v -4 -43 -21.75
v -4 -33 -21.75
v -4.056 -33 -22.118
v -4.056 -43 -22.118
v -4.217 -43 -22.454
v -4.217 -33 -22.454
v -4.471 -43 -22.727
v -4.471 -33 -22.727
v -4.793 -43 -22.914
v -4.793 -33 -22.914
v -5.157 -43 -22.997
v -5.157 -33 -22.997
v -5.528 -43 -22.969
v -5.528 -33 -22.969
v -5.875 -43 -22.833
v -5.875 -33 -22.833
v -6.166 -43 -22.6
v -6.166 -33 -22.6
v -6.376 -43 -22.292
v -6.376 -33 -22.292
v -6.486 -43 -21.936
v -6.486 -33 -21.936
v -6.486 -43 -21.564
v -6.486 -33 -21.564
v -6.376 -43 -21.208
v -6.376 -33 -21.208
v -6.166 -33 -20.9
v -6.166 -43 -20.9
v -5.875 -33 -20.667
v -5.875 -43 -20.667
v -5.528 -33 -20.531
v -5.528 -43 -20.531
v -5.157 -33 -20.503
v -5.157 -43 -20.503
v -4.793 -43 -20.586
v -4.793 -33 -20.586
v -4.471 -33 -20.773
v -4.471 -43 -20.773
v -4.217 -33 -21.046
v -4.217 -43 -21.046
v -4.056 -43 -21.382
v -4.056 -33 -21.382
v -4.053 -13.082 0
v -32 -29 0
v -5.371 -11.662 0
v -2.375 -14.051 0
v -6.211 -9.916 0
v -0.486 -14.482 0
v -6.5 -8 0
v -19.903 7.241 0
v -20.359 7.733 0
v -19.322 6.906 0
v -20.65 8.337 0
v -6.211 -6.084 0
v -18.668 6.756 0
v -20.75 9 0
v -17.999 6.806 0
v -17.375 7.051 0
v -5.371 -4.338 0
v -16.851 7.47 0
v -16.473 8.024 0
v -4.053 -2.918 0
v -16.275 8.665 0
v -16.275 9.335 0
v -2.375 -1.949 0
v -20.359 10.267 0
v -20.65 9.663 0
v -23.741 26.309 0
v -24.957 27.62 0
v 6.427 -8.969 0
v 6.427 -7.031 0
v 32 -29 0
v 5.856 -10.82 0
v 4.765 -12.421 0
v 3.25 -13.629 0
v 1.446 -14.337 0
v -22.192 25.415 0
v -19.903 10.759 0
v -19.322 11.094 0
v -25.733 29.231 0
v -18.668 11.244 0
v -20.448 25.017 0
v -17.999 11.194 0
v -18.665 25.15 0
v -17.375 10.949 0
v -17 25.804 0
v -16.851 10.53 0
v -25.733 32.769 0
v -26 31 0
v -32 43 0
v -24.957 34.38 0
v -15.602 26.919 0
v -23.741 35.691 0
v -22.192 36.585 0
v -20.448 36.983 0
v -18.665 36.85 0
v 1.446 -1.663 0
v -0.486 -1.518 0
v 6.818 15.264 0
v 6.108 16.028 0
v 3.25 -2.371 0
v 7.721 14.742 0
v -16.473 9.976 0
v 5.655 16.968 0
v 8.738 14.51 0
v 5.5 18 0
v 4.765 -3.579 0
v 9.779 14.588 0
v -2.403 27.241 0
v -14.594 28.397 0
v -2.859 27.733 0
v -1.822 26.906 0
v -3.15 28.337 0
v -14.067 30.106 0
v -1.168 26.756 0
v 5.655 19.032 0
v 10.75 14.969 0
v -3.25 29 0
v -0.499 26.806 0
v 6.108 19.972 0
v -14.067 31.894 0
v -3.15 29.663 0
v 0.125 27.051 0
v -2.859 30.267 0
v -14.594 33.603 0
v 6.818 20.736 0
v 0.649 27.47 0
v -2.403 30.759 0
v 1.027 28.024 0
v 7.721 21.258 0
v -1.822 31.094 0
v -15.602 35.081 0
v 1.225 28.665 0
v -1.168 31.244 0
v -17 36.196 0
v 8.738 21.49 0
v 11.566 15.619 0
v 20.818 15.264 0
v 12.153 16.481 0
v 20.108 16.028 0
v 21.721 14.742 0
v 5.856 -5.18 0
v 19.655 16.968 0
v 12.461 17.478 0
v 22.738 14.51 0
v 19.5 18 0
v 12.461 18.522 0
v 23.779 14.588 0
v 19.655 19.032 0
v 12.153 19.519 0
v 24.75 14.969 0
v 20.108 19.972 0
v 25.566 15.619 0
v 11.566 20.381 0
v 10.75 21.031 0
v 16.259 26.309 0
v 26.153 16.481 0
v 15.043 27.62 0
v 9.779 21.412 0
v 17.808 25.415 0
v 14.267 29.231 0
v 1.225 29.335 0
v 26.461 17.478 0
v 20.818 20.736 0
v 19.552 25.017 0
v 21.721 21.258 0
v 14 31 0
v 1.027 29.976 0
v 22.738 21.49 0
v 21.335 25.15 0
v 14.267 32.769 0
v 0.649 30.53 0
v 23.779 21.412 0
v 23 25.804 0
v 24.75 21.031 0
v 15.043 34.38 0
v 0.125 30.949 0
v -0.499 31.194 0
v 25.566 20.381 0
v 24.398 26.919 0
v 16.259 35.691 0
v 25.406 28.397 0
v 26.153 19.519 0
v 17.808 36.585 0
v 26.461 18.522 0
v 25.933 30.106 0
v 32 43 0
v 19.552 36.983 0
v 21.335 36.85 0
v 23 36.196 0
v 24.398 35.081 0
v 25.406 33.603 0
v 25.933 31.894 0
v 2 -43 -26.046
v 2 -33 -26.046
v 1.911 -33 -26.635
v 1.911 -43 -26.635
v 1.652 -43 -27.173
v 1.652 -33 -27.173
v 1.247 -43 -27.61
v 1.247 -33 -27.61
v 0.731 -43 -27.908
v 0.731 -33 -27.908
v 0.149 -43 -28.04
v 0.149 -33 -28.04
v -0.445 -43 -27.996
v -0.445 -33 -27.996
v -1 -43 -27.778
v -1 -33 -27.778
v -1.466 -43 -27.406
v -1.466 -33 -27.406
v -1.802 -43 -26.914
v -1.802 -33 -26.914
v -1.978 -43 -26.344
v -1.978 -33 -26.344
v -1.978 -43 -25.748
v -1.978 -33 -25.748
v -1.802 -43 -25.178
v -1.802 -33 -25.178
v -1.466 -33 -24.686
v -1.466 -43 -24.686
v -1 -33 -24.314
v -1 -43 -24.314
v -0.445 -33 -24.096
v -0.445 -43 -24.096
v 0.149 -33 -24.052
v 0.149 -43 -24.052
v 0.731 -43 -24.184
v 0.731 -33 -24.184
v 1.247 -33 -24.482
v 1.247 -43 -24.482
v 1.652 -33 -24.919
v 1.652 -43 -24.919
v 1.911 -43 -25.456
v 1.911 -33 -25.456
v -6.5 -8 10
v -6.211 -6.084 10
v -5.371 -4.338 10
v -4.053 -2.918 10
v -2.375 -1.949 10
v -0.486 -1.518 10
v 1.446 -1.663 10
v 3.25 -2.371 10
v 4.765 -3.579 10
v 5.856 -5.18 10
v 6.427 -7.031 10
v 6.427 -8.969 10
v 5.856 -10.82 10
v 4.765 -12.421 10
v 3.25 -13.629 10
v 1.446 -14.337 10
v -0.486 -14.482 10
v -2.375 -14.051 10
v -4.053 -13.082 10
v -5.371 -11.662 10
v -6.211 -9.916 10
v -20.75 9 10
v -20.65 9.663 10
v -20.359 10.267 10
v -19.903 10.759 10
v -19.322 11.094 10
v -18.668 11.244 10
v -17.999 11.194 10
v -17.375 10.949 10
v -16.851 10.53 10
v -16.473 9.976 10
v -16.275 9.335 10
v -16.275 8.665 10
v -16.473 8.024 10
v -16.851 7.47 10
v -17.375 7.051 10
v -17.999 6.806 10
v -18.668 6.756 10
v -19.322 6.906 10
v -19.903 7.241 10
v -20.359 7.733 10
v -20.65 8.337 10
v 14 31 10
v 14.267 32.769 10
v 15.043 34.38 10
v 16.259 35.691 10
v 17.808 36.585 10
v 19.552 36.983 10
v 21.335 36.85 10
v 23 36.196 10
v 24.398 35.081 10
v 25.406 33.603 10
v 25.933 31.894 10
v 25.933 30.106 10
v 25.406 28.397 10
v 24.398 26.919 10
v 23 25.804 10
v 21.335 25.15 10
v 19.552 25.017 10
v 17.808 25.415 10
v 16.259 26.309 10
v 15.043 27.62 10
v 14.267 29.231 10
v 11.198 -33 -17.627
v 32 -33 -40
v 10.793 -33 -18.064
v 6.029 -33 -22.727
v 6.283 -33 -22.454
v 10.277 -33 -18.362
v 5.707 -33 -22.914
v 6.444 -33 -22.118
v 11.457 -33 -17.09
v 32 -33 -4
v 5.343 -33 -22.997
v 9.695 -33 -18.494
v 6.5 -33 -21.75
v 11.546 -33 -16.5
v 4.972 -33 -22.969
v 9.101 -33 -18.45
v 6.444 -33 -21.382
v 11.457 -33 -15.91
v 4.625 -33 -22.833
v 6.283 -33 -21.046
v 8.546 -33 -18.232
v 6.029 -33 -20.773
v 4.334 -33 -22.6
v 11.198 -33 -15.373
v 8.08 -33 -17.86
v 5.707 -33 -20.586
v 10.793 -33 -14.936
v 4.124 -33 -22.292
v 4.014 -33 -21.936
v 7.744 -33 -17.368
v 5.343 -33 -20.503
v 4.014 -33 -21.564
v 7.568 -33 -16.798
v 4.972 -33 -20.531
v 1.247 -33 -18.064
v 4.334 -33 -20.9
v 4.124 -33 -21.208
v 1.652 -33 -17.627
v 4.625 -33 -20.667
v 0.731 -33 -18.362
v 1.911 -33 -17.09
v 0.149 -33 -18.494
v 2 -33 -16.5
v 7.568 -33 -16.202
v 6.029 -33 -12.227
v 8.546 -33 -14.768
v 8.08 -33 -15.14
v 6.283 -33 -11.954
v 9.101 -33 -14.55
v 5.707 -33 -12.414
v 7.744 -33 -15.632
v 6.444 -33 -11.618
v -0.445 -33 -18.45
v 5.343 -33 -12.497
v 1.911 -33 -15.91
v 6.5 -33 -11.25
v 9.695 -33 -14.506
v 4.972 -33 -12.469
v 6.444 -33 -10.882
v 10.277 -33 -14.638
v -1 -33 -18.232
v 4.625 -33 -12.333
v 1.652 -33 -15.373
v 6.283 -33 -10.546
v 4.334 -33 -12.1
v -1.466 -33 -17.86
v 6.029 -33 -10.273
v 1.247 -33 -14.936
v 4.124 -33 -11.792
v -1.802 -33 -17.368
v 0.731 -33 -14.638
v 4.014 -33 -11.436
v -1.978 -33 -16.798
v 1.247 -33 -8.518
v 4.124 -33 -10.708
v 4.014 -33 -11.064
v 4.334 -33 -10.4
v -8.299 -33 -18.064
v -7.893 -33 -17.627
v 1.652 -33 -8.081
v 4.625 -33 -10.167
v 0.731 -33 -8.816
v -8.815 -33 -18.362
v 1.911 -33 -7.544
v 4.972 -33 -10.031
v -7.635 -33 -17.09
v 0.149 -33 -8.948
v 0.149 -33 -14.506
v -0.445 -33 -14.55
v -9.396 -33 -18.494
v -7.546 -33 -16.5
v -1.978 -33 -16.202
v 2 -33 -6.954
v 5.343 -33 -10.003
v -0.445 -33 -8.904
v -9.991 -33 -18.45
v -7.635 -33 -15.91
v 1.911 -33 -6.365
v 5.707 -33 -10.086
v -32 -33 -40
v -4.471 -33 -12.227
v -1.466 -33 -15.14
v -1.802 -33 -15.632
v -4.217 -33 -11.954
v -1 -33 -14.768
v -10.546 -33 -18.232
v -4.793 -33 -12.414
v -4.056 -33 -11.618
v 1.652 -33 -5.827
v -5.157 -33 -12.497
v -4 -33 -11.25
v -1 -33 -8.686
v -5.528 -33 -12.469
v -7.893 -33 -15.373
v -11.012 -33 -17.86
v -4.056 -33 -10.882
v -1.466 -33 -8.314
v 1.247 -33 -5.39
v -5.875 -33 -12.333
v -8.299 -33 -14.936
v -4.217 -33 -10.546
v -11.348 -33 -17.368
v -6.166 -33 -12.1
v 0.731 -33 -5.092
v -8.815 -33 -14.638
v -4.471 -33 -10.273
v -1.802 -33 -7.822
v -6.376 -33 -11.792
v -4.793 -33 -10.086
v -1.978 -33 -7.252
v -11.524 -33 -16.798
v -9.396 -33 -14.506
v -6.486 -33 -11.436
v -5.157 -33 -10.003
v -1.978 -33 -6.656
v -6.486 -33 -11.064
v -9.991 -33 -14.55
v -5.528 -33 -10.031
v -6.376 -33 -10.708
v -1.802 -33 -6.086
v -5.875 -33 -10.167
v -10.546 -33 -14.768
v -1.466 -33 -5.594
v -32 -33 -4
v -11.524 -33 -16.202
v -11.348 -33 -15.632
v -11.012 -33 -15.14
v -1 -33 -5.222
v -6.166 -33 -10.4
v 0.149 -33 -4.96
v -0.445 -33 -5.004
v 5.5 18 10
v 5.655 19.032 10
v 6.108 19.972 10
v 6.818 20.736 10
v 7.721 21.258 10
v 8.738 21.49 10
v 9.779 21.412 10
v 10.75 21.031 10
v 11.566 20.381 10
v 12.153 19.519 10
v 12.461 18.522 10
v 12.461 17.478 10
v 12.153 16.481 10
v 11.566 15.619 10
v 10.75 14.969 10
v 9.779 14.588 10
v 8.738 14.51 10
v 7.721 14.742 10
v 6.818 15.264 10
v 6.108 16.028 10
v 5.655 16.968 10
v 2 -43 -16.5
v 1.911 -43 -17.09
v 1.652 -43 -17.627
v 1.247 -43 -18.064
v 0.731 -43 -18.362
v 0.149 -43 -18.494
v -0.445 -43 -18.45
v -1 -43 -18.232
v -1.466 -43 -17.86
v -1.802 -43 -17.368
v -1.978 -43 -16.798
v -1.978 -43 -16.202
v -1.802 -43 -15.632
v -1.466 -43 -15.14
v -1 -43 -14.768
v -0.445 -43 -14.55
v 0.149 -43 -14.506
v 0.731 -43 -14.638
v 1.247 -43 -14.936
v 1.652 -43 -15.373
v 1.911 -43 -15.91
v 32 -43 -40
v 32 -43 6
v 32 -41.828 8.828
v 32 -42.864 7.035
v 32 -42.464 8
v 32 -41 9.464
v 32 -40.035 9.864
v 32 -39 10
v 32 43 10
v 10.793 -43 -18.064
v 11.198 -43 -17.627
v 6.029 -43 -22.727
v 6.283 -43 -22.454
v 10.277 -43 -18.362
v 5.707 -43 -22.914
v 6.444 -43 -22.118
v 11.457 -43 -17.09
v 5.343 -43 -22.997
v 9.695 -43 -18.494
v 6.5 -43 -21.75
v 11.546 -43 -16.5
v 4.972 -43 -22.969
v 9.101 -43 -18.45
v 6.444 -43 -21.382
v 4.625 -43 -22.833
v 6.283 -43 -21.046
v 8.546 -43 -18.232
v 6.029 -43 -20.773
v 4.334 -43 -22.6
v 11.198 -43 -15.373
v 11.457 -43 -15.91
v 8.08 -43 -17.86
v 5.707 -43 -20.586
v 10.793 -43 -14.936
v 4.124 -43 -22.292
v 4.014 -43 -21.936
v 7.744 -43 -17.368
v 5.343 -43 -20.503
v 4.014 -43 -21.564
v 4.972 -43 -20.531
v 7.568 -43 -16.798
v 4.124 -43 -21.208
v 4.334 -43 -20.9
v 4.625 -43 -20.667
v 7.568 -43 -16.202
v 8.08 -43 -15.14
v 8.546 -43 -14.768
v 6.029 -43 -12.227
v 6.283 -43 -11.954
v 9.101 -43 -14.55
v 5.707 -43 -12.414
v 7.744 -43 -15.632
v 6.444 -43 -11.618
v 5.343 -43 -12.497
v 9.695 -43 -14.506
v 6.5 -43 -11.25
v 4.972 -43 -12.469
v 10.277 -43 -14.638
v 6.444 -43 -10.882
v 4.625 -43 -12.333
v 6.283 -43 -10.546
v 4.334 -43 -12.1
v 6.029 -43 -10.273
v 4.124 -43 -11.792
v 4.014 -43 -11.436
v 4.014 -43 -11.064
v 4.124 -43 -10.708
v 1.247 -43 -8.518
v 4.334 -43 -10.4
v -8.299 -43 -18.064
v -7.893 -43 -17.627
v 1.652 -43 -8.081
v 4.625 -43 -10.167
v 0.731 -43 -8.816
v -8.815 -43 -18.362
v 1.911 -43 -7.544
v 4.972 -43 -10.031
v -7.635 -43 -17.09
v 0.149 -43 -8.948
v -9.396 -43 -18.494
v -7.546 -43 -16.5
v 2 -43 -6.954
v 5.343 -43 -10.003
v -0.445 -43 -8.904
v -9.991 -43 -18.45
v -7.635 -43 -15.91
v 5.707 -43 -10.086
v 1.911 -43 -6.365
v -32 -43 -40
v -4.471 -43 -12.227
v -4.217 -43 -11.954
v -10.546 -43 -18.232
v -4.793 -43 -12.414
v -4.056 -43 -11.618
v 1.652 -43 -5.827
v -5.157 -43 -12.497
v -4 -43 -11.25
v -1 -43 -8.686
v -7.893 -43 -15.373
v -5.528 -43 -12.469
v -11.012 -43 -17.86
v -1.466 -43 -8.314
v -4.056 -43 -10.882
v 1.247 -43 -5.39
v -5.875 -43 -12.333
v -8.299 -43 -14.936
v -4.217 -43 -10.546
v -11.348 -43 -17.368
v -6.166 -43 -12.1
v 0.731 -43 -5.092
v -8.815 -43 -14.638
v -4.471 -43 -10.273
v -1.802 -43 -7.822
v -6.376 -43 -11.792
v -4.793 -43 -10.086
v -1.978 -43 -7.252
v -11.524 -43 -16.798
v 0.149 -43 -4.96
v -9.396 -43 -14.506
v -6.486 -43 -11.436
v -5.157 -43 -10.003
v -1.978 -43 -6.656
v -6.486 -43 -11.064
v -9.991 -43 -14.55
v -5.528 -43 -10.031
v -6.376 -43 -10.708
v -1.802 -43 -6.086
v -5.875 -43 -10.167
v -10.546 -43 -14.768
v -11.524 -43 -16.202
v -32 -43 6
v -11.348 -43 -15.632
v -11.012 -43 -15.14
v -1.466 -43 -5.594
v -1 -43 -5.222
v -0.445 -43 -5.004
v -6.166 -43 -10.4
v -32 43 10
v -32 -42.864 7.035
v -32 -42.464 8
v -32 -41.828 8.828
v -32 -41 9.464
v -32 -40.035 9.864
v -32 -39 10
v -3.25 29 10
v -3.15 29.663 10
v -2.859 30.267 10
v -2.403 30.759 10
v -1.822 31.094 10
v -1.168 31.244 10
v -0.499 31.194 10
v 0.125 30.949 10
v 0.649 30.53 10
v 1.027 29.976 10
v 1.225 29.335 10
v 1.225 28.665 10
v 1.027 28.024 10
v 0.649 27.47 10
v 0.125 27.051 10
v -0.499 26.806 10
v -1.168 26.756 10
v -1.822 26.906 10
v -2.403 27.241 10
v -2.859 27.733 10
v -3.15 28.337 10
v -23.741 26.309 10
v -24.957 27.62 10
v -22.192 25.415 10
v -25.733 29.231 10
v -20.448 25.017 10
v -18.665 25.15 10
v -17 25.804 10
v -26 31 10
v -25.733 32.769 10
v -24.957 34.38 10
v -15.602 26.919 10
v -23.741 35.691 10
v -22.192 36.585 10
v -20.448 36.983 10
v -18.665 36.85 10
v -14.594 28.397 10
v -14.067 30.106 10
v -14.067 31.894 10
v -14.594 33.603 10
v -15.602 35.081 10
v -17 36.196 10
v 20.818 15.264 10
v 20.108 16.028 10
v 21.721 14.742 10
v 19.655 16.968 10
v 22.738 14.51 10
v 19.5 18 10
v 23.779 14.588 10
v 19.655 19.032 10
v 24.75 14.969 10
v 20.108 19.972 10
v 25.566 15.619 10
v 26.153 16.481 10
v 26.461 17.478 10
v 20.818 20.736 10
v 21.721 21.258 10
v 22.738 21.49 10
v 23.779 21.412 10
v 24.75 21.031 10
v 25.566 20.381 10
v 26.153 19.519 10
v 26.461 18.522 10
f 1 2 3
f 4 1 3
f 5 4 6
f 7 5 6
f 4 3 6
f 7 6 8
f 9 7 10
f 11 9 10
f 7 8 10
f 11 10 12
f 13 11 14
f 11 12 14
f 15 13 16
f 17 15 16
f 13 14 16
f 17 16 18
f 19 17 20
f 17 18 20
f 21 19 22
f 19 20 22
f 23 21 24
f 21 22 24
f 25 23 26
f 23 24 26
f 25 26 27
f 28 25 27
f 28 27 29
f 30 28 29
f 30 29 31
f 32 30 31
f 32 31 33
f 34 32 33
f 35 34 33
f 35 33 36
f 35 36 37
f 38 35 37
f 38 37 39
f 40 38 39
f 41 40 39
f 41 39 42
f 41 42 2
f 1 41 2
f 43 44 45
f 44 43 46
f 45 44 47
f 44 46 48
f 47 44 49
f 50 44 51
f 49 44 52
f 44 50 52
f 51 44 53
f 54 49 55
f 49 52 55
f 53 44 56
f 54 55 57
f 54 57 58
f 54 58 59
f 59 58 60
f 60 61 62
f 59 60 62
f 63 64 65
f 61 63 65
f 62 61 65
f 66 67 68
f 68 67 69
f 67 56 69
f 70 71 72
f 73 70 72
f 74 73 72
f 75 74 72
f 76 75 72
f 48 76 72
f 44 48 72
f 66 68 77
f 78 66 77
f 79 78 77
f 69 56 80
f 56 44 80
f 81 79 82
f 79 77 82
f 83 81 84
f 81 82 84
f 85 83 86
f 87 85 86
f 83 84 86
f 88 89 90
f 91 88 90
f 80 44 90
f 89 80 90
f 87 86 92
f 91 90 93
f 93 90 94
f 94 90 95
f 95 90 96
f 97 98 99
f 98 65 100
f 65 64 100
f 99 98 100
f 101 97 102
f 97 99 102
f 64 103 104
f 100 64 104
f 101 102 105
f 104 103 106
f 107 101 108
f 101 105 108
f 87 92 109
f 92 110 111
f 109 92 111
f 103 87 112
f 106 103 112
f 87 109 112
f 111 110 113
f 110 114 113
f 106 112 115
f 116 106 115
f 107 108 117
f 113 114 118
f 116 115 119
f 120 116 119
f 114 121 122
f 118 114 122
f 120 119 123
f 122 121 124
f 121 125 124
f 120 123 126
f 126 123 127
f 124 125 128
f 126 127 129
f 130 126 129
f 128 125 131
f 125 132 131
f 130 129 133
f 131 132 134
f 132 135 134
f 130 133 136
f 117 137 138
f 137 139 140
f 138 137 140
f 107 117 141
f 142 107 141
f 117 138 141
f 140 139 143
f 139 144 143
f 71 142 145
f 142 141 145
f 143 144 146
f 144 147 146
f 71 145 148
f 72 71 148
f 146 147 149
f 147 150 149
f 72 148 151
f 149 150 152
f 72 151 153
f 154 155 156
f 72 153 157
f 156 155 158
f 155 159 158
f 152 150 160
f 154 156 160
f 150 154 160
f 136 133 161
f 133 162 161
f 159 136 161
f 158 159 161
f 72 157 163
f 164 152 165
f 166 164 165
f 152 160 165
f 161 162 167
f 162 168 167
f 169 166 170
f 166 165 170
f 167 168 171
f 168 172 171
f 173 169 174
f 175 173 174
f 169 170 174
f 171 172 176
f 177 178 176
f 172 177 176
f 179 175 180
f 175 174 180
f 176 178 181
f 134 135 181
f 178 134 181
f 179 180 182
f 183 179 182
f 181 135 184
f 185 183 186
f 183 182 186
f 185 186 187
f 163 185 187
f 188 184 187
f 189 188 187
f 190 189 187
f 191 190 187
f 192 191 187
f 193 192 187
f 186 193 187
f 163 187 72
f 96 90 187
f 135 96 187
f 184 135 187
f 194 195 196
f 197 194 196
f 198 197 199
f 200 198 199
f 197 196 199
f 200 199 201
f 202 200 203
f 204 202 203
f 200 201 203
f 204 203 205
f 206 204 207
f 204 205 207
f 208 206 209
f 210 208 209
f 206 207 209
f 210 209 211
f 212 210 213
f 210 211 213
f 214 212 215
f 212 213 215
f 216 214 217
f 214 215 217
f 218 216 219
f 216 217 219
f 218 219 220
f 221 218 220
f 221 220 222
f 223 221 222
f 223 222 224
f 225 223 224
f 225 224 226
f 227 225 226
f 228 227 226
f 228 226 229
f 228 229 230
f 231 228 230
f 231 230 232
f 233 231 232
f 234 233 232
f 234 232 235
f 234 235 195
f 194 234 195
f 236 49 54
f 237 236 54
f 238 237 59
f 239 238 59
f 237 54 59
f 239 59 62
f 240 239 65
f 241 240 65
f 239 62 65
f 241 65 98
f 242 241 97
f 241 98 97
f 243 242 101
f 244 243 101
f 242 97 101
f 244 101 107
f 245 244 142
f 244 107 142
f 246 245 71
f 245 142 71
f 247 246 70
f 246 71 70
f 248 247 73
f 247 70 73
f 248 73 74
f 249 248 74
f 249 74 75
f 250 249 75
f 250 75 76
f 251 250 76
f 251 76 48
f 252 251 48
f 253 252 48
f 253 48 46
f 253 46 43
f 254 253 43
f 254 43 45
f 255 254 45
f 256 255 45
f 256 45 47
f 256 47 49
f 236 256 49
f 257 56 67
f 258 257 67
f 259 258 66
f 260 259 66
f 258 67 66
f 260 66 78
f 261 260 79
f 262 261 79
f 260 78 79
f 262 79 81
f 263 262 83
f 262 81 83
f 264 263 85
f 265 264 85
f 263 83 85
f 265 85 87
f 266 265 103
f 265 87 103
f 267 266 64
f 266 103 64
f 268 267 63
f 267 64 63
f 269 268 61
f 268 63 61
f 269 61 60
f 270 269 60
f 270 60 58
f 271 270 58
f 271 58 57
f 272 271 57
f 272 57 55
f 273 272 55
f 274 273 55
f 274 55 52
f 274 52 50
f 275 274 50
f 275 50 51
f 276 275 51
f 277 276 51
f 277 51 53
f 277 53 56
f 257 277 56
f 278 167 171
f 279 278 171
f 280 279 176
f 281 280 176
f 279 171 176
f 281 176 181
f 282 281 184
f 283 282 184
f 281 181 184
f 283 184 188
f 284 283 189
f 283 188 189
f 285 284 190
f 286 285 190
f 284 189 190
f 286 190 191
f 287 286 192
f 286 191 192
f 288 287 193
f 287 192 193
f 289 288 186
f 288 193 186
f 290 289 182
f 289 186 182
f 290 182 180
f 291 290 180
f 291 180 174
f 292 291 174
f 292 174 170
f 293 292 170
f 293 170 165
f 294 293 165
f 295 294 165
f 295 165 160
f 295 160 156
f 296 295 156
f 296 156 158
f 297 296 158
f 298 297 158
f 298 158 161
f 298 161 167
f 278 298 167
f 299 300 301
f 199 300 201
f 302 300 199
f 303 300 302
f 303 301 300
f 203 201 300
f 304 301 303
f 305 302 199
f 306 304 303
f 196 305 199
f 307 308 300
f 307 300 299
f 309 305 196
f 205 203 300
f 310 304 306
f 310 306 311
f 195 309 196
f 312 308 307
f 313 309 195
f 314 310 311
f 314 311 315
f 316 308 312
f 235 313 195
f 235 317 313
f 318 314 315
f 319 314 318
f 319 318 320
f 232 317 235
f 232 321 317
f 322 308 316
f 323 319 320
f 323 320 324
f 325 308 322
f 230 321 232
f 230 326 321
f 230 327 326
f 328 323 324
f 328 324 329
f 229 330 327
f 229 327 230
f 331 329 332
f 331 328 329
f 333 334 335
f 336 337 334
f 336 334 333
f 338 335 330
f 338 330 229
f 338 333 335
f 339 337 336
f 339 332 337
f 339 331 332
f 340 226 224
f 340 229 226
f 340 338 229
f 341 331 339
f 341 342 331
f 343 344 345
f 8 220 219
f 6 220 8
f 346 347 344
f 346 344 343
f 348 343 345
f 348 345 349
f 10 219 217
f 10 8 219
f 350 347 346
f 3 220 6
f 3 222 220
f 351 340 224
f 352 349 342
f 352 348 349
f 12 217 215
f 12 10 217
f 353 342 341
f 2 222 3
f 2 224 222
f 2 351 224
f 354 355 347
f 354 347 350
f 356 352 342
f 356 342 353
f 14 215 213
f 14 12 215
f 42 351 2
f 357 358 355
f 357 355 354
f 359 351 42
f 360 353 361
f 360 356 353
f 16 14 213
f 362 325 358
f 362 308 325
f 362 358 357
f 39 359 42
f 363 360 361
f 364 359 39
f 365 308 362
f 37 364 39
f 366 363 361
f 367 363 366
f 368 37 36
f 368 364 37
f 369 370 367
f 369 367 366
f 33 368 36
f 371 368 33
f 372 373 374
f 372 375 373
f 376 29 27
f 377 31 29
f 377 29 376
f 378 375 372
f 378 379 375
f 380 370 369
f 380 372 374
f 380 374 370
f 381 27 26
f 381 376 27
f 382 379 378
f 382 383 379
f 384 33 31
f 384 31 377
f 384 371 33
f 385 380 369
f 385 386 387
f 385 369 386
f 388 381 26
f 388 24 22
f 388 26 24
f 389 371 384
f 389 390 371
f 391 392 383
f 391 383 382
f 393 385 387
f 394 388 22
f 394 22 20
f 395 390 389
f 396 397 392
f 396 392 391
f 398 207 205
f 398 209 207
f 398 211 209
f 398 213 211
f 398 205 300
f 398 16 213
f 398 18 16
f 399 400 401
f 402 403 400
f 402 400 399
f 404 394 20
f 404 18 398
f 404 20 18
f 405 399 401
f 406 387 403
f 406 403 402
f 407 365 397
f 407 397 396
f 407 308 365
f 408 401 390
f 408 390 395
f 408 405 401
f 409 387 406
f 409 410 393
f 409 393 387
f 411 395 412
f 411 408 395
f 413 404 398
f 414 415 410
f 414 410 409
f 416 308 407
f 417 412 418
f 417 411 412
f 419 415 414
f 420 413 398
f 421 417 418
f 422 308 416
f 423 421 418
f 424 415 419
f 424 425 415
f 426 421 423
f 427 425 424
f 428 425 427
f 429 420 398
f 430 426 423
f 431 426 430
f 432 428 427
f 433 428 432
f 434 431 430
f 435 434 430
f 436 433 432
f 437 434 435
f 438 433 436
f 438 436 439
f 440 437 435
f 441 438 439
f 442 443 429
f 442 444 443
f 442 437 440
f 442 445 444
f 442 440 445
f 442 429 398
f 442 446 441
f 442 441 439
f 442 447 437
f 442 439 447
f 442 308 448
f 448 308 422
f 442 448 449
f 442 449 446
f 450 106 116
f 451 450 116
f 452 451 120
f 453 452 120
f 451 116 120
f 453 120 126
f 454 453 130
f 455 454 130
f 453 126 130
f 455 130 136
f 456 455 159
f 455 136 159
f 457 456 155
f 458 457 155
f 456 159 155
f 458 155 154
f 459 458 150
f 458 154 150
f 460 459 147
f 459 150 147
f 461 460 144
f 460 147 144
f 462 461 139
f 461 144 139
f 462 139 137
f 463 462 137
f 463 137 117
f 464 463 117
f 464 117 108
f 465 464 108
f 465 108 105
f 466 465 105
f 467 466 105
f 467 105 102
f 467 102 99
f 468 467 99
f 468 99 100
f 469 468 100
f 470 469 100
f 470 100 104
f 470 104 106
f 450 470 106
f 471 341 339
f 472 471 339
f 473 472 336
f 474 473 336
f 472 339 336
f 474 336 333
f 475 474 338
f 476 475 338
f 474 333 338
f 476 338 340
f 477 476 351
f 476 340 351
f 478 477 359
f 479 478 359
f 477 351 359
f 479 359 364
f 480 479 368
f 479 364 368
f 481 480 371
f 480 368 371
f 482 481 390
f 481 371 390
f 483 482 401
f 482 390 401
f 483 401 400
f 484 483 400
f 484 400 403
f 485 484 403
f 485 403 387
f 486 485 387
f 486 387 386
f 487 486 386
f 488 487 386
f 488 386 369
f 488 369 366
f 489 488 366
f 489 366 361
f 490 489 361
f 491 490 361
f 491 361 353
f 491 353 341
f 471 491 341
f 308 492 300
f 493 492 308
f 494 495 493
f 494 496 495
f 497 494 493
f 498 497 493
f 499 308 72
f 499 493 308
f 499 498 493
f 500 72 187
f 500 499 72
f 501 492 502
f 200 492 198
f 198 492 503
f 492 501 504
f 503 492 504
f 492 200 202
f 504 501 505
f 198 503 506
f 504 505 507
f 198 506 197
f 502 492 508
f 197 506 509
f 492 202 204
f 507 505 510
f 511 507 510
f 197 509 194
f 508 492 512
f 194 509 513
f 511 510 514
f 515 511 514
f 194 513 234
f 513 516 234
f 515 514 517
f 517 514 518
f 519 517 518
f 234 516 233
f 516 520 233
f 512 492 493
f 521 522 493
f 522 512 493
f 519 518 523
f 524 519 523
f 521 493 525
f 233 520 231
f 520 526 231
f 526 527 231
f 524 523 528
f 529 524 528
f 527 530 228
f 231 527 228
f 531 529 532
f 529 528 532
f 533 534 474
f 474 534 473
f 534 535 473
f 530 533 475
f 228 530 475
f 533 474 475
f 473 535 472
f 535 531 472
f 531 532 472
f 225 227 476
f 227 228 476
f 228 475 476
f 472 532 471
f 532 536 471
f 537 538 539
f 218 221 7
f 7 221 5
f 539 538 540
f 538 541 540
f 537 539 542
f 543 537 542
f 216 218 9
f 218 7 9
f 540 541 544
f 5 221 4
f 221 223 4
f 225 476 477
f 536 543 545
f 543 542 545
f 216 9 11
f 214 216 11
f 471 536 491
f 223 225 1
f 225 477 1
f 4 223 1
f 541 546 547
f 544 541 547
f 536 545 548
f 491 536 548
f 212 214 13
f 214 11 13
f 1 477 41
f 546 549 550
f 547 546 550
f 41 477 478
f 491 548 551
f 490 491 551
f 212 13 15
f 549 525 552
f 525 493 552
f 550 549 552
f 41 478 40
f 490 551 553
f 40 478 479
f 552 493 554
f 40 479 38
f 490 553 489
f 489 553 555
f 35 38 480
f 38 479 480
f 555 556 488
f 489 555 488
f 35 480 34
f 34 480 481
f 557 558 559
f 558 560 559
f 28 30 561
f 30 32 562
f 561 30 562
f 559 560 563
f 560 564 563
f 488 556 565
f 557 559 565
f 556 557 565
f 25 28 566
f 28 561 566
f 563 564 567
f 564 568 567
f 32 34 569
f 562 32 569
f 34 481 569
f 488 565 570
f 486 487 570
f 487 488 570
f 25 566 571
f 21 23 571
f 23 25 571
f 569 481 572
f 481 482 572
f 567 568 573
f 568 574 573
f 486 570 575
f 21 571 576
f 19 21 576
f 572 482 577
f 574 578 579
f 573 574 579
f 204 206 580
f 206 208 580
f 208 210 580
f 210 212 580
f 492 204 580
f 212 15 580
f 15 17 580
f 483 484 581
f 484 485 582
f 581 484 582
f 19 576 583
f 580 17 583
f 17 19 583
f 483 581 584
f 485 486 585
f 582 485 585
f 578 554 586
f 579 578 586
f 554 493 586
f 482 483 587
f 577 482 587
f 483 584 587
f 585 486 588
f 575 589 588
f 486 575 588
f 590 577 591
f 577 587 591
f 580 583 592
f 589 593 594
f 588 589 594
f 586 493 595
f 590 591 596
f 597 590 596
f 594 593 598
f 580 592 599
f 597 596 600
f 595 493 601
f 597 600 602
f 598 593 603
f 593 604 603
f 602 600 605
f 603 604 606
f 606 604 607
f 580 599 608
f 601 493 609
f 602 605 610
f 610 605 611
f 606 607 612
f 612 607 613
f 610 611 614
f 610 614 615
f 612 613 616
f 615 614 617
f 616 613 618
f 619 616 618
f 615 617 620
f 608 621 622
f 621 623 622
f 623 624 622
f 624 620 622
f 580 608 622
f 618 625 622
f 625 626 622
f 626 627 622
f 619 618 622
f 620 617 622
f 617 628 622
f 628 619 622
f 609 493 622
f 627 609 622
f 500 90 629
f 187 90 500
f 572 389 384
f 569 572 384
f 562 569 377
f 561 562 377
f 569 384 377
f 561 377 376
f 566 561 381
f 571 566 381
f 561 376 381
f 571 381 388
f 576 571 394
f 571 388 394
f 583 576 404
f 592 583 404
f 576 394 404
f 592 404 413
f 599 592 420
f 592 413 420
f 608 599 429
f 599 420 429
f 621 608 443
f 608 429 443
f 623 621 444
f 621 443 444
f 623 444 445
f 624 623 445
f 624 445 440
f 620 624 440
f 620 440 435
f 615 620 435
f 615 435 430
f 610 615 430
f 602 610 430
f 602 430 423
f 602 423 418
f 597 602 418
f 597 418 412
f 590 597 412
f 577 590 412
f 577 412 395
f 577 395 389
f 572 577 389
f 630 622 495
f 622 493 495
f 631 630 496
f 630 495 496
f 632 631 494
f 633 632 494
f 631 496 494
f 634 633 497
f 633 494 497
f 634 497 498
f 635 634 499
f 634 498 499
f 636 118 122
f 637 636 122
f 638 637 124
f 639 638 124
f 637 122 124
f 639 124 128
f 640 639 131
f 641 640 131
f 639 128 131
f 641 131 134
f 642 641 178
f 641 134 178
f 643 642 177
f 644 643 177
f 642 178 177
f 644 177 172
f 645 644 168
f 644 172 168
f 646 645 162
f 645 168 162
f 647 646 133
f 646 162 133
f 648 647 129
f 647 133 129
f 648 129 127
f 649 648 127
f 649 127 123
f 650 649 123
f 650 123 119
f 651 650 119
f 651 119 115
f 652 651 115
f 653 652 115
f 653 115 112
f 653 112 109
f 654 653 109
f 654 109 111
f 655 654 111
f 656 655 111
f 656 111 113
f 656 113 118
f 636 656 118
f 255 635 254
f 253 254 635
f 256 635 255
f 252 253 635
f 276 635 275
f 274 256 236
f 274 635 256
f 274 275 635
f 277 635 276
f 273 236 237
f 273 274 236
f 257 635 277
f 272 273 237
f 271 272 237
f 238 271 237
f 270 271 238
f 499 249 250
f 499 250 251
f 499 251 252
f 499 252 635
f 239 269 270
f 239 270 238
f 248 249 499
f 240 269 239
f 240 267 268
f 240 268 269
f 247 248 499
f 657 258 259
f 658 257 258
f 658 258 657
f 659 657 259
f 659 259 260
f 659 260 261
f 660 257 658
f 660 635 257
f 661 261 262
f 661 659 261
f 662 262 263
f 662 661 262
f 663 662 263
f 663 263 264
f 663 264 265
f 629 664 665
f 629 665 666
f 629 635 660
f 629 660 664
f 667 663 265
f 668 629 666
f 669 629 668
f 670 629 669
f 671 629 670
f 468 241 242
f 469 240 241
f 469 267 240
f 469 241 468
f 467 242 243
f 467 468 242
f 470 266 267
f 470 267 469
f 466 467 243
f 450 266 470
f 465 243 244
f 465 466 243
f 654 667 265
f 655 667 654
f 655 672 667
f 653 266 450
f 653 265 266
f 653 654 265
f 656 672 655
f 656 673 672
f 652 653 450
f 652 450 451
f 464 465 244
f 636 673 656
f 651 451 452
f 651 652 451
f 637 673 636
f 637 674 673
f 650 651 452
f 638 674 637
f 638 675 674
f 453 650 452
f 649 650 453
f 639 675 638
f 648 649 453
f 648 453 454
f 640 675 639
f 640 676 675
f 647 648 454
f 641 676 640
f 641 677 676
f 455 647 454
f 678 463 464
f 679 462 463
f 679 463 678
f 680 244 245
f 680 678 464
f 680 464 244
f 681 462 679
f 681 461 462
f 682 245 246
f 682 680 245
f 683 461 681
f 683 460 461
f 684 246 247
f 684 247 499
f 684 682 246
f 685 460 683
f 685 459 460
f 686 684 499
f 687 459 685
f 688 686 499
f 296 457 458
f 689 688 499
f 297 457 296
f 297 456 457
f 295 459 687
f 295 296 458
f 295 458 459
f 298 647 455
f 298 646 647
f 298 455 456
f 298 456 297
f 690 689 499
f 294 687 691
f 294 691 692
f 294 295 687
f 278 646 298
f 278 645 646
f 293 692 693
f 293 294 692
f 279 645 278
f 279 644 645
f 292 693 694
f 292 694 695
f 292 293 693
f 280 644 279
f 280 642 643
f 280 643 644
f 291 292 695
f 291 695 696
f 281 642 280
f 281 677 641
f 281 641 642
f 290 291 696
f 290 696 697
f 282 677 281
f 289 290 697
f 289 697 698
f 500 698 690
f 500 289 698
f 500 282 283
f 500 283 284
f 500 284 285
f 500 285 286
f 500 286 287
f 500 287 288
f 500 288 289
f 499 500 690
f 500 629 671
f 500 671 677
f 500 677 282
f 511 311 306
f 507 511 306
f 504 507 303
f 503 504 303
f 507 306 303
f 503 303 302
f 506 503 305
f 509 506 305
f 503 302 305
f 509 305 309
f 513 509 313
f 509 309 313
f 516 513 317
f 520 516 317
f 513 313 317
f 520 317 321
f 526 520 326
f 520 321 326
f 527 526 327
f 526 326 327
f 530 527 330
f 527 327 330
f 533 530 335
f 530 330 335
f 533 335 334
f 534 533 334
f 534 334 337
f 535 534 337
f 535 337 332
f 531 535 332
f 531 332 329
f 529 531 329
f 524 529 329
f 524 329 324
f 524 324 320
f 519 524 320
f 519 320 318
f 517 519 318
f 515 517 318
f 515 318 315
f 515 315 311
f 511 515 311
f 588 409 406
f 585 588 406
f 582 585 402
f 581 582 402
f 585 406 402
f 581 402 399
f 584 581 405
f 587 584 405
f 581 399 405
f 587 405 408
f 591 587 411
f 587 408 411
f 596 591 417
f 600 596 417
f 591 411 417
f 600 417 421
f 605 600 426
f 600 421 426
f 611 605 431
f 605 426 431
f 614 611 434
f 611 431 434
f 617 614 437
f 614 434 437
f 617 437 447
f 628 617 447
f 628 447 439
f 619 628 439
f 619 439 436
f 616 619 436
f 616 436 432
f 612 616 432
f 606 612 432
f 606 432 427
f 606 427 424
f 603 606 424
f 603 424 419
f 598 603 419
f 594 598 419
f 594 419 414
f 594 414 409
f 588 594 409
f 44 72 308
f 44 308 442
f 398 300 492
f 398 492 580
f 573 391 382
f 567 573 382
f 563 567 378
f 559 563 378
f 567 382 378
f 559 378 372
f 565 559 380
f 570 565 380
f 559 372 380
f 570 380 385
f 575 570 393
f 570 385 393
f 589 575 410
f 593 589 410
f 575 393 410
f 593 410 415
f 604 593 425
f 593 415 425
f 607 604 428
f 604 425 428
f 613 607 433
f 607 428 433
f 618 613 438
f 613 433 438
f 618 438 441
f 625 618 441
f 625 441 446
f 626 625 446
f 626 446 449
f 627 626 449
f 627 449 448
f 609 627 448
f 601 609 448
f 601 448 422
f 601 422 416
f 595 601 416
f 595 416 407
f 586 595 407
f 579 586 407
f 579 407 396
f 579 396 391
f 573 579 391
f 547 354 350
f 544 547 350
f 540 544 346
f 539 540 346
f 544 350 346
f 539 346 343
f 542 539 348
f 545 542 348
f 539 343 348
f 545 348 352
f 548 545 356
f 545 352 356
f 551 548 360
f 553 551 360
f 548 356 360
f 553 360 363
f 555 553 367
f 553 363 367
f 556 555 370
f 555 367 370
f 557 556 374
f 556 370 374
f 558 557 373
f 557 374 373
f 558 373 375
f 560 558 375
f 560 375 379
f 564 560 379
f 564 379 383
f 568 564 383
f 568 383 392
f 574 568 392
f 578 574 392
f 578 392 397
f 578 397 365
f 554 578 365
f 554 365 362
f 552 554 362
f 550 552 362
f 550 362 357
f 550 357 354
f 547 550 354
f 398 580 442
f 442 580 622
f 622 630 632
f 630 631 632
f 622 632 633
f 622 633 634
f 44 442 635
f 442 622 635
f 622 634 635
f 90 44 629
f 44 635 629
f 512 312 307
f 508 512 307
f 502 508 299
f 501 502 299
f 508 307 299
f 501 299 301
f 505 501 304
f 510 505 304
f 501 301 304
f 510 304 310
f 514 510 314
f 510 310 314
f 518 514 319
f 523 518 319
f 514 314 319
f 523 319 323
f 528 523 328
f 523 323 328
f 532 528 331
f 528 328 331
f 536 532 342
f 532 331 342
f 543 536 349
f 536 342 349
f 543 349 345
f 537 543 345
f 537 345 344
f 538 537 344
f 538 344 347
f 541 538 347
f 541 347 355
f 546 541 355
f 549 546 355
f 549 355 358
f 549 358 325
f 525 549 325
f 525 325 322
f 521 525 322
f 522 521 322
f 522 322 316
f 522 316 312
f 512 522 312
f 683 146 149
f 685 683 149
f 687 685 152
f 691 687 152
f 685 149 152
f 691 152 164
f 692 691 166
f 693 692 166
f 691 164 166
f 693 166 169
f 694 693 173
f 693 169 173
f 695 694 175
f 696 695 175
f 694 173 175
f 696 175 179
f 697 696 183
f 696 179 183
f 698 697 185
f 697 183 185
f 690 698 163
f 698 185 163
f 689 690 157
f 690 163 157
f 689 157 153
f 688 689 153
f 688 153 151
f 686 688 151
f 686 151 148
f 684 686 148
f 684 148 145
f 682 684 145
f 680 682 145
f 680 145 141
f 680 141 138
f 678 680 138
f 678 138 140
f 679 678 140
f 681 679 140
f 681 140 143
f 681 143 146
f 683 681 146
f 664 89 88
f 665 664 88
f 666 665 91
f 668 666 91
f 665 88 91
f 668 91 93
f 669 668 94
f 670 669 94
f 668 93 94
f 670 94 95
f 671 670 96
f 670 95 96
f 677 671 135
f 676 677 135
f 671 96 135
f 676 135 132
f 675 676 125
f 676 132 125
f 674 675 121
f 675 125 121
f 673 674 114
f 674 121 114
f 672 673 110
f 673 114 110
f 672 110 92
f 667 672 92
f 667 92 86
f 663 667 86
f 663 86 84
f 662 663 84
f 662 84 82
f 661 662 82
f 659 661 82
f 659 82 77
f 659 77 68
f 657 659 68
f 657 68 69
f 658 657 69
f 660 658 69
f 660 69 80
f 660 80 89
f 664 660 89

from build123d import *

# Parameters (mm, degrees)
SKETCH1_W           = 64
SKETCH1_H           = 86
BOSS_EXTRUDE1_DEPTH = 10
SKETCH2_W           = 64
SKETCH2_H           = 10
BOSS_EXTRUDE2_DEPTH = 40
SKETCH4_R           = 6
SKETCH4_R_2         = 2.25
SKETCH4_R_3         = 3.5
SKETCH4_R_4         = 6.5
CUT_EXTRUDE1_DEPTH  = 11
SKETCH6_R           = 2
SKETCH6_R_2         = 1.25
CUT_EXTRUDE2_DEPTH  = 11
CHAMFER1_SIZE       = 4
FILLET1_R           = 4


with BuildPart() as part:
    # Sketch1 → Boss-Extrude1 (new body)
    with BuildSketch(Plane.XY):
        Rectangle(SKETCH1_W, SKETCH1_H)
    extrude(amount=BOSS_EXTRUDE1_DEPTH)

    # Sketch2 → Boss-Extrude2 (add)
    with BuildSketch(Plane(origin=(0, 0, 0), x_dir=(-1, 0, 0), z_dir=(0, 0, -1))):
        with Locations((0, -38)):
            Rectangle(SKETCH2_W, SKETCH2_H)
    extrude(amount=BOSS_EXTRUDE2_DEPTH)

    # Sketch4 → Cut-Extrude1 (cut, through all)
    with BuildSketch(Plane(origin=(0, 0, 0), x_dir=(-1, 0, 0), z_dir=(0, 0, -1))):
        with Locations((20, 31)):
            Circle(SKETCH4_R)
        with Locations((1, 29)):
            Circle(SKETCH4_R_2)
        with Locations((-20, 31)):
            Circle(SKETCH4_R)
        with Locations((-9, 18)):
            Circle(SKETCH4_R_3)
        with Locations((-23, 18)):
            Circle(SKETCH4_R_3)
        with Locations((18.5, 9)):
            Circle(SKETCH4_R_2)
        with Locations((0, -8)):
            Circle(SKETCH4_R_4)
    extrude(amount=-CUT_EXTRUDE1_DEPTH, mode=Mode.SUBTRACT)

    # Sketch6 → Cut-Extrude2 (cut, through all)
    with BuildSketch(Plane(origin=(0, -33, 0), x_dir=(1, 0, 0), z_dir=(0, 1, 0))):
        with Locations((0, 16.5)):
            Circle(SKETCH6_R)
        with Locations((5.25, 21.75)):
            Circle(SKETCH6_R_2)
        with Locations((5.25, 11.25)):
            Circle(SKETCH6_R_2)
        with Locations((-5.25, 11.25)):
            Circle(SKETCH6_R_2)
        with Locations((-5.25, 21.75)):
            Circle(SKETCH6_R_2)
        with Locations((-9.545941546, 16.5)):
            Circle(SKETCH6_R)
        with Locations((0, 6.954058454)):
            Circle(SKETCH6_R)
        with Locations((9.545941546, 16.5)):
            Circle(SKETCH6_R)
        with Locations((0, 26.045941546)):
            Circle(SKETCH6_R)
    extrude(amount=-CUT_EXTRUDE2_DEPTH, mode=Mode.SUBTRACT)

    # Chamfer1
    chamfer1_edges = [part.edges().sort_by_distance(p)[0] for p in [
        (0, -33, 0),
    ]]
    chamfer(chamfer1_edges, length=CHAMFER1_SIZE)

    # Fillet1
    fillet1_edges = [part.edges().sort_by_distance(p)[0] for p in [
        (0, -43, 10),
    ]]
    fillet(fillet1_edges, radius=FILLET1_R)


solid = part.part
